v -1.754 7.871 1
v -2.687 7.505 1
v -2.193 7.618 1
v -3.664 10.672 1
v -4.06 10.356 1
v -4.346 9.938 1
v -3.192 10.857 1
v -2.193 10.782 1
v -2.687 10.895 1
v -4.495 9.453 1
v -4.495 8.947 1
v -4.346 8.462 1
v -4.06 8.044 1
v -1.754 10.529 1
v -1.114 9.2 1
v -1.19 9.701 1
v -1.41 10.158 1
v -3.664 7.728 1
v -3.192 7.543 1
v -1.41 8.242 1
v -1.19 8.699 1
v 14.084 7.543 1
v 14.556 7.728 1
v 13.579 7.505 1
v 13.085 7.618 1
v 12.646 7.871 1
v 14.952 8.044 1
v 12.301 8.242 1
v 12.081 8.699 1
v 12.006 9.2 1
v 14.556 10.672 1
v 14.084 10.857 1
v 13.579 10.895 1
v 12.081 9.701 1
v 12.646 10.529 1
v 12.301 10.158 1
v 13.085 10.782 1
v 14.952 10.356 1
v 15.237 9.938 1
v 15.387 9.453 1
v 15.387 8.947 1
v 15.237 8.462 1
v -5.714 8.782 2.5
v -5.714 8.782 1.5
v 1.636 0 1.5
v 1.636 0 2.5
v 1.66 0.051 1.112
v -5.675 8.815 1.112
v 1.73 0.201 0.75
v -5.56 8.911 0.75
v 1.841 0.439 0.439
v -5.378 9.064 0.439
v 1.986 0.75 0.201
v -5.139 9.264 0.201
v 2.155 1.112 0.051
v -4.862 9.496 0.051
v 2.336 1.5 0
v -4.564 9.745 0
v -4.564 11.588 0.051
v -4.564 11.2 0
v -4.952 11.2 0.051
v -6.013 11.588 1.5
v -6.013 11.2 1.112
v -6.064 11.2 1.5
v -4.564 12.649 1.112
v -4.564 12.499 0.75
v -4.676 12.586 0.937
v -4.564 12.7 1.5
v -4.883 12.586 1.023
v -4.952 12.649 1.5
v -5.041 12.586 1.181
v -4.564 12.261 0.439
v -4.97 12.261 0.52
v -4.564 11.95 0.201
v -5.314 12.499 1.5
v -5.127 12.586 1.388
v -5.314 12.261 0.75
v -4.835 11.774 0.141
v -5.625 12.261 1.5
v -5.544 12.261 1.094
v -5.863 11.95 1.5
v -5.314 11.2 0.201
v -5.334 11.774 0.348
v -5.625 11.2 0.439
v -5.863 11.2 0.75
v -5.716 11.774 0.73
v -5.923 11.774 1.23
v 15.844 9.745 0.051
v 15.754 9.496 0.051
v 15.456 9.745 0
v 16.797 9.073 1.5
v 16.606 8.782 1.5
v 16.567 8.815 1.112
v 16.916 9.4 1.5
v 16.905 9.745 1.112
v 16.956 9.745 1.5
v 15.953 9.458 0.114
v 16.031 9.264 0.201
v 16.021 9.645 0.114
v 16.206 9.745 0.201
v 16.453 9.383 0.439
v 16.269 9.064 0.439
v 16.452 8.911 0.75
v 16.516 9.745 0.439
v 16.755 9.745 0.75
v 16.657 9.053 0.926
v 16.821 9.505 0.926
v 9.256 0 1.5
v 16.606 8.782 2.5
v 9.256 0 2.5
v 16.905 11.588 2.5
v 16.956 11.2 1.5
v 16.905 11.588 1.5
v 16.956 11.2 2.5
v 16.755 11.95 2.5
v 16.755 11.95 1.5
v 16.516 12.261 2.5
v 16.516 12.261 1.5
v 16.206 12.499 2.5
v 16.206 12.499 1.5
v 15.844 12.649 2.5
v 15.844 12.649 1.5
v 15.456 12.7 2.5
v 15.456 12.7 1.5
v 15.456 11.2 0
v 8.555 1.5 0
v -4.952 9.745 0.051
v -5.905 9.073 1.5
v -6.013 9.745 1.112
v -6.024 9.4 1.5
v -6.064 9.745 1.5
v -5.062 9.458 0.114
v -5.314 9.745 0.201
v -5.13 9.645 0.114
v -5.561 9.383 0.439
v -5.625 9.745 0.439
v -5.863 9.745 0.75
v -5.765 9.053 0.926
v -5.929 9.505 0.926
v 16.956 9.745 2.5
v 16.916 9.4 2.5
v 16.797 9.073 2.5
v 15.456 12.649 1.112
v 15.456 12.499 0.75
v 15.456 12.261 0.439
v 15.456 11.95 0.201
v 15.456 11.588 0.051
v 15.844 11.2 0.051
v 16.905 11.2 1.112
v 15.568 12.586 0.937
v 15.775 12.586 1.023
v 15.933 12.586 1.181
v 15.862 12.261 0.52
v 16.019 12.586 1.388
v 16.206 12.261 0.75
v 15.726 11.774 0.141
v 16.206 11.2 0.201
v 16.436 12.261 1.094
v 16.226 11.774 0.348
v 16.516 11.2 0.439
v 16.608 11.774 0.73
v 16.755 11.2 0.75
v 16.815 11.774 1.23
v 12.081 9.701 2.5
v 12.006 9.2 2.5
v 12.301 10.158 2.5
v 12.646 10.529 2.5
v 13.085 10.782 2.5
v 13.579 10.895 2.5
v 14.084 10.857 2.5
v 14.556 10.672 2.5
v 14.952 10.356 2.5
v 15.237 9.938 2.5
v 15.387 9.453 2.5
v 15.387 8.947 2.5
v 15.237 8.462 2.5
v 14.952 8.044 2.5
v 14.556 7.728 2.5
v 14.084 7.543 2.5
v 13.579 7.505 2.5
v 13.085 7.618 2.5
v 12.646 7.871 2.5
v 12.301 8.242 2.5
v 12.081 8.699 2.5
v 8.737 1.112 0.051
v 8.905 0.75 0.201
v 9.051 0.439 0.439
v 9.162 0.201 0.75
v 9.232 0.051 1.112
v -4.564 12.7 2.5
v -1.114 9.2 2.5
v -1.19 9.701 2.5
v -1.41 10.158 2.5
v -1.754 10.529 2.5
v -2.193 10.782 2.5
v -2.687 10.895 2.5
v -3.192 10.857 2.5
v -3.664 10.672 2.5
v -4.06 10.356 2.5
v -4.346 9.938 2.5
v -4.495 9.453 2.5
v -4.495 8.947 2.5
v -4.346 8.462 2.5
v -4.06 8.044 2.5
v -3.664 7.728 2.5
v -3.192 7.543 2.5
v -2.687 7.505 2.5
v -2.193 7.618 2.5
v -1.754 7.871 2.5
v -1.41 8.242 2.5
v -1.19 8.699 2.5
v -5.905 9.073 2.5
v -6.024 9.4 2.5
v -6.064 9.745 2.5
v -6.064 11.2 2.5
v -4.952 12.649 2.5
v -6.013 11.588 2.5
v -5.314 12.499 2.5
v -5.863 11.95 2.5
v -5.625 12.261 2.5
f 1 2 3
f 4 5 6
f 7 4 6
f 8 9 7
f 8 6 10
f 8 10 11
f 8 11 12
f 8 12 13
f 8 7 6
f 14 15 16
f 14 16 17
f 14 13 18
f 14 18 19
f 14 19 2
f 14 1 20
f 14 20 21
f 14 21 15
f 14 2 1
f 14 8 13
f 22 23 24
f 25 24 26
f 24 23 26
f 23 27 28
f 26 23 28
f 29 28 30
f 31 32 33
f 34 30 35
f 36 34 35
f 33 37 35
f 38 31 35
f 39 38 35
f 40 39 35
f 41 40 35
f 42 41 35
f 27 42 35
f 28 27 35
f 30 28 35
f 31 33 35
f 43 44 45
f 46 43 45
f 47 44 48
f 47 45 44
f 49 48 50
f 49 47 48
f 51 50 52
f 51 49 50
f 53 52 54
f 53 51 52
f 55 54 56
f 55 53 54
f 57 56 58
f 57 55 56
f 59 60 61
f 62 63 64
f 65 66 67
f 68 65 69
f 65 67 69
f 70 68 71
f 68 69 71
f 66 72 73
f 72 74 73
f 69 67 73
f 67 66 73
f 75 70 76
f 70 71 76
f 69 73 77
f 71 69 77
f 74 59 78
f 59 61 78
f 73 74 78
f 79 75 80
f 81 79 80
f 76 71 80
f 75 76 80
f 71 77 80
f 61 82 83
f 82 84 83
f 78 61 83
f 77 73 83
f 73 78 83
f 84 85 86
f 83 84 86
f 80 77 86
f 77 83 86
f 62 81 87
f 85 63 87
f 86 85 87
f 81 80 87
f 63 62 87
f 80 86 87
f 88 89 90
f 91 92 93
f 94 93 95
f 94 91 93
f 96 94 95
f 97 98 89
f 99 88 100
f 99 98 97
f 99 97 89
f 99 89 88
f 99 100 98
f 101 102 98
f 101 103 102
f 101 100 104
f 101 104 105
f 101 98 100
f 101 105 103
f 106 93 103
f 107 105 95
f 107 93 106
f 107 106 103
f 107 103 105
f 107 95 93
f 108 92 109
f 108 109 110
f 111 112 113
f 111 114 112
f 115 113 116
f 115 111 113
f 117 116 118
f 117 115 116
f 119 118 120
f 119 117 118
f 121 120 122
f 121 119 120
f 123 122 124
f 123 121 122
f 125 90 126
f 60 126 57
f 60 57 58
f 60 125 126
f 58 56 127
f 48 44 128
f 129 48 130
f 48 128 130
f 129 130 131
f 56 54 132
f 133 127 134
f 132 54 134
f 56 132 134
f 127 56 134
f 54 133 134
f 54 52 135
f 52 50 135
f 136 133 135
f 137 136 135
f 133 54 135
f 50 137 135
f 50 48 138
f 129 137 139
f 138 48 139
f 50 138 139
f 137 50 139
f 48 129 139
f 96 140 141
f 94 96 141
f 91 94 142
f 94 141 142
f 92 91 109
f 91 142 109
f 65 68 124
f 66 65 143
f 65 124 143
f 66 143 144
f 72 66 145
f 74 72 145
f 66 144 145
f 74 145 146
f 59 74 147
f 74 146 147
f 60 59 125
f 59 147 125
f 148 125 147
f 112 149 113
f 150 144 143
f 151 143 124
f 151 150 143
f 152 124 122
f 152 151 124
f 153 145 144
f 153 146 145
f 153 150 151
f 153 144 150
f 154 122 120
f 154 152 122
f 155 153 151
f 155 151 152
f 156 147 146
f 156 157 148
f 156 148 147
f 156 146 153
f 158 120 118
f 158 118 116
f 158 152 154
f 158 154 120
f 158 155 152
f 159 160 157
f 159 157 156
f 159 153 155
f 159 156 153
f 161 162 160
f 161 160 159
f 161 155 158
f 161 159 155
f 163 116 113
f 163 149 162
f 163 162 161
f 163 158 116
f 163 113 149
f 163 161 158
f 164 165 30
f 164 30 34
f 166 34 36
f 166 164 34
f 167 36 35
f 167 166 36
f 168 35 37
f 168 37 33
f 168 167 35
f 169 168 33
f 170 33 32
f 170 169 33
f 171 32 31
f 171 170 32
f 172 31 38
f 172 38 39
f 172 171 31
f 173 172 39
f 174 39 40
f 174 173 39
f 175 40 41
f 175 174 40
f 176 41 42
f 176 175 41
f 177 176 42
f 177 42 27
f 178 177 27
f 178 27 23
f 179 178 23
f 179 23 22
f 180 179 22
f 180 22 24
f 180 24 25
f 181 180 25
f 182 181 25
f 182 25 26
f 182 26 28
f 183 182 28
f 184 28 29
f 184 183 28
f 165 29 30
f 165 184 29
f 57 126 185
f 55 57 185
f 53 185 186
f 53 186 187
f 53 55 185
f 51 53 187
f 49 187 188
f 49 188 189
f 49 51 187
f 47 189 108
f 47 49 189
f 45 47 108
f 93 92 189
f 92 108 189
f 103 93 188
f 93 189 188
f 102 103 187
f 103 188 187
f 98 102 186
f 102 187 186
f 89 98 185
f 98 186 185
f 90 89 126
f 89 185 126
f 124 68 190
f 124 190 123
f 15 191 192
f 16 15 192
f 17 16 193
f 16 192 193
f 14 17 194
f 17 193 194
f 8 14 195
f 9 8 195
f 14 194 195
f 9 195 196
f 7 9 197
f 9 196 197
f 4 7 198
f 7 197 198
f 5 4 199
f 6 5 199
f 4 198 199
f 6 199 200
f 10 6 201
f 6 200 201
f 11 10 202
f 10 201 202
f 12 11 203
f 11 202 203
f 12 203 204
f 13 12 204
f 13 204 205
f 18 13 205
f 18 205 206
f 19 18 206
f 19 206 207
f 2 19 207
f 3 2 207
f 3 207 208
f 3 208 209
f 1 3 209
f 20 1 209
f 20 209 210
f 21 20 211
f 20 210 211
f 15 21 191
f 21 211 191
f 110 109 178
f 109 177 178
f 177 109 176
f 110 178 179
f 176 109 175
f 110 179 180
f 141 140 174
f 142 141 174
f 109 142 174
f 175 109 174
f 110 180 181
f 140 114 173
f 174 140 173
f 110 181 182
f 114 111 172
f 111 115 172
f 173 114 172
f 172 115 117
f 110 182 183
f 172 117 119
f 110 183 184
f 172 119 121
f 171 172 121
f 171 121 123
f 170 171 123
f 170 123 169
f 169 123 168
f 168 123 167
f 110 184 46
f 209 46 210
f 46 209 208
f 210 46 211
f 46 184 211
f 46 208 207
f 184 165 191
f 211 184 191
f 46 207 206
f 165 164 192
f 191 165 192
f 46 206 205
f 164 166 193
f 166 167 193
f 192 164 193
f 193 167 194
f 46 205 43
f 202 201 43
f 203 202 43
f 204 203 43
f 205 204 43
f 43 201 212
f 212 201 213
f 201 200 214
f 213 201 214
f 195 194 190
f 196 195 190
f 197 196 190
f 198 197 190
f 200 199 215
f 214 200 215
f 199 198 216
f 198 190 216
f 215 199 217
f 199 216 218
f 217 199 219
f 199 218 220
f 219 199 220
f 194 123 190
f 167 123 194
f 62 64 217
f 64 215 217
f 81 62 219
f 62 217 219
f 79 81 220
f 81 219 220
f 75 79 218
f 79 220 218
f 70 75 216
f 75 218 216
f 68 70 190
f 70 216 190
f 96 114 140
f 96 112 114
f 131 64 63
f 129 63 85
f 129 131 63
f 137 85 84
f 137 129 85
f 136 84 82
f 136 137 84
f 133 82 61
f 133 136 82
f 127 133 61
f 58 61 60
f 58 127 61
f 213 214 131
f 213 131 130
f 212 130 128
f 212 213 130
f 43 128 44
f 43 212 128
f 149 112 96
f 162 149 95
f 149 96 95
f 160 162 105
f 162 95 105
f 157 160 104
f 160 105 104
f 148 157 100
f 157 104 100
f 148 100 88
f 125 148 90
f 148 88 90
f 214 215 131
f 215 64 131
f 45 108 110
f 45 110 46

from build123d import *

# Parameters (mm, degrees)
BOSS_EXTRUDE1_DEPTH = 2.5
SKETCH2_R           = 1.7
CUT_EXTRUDE1_DEPTH  = 1.5
FILLET1_R           = 1.5


with BuildPart() as part:
    # Sketch1 → Boss-Extrude1 (new body)
    with BuildSketch(Plane.XY):
        Polygon((-6.06419618, 12.7), (-6.06419618, 9.2), (1.63580382, 0), (5.44580382, 0), (5.44580382, 12.7), align=None)
    extrude(amount=BOSS_EXTRUDE1_DEPTH)

    # Sketch2 → Cut-Extrude1 (cut)
    with BuildSketch(Plane.XY.offset(2.5)):
        with Locations((-2.81419618, 9.2)):
            Circle(SKETCH2_R)
    extrude(amount=-CUT_EXTRUDE1_DEPTH, mode=Mode.SUBTRACT)

    # Fillet1
    fillet1_edges = [part.edges().sort_by_distance(p)[0] for p in [
        (3.54080382, 0, 0),
        (-2.21419618, 4.6, 0),
        (-6.06419618, 10.95, 0),
        (-0.30919618, 12.7, 0),
        (-6.06419618, 9.2, 1.25),
        (-6.06419618, 12.7, 1.25),
    ]]
    fillet(fillet1_edges, radius=FILLET1_R)

    # Mirror2: part across plane


with BuildPart() as part_1:
    add(part.part)
    add(part.part.mirror(Plane(origin=(5.44580382, 0, 2.5), x_dir=(0, 0, 1), z_dir=(-1, 0, 0))))


solid = part_1.part
